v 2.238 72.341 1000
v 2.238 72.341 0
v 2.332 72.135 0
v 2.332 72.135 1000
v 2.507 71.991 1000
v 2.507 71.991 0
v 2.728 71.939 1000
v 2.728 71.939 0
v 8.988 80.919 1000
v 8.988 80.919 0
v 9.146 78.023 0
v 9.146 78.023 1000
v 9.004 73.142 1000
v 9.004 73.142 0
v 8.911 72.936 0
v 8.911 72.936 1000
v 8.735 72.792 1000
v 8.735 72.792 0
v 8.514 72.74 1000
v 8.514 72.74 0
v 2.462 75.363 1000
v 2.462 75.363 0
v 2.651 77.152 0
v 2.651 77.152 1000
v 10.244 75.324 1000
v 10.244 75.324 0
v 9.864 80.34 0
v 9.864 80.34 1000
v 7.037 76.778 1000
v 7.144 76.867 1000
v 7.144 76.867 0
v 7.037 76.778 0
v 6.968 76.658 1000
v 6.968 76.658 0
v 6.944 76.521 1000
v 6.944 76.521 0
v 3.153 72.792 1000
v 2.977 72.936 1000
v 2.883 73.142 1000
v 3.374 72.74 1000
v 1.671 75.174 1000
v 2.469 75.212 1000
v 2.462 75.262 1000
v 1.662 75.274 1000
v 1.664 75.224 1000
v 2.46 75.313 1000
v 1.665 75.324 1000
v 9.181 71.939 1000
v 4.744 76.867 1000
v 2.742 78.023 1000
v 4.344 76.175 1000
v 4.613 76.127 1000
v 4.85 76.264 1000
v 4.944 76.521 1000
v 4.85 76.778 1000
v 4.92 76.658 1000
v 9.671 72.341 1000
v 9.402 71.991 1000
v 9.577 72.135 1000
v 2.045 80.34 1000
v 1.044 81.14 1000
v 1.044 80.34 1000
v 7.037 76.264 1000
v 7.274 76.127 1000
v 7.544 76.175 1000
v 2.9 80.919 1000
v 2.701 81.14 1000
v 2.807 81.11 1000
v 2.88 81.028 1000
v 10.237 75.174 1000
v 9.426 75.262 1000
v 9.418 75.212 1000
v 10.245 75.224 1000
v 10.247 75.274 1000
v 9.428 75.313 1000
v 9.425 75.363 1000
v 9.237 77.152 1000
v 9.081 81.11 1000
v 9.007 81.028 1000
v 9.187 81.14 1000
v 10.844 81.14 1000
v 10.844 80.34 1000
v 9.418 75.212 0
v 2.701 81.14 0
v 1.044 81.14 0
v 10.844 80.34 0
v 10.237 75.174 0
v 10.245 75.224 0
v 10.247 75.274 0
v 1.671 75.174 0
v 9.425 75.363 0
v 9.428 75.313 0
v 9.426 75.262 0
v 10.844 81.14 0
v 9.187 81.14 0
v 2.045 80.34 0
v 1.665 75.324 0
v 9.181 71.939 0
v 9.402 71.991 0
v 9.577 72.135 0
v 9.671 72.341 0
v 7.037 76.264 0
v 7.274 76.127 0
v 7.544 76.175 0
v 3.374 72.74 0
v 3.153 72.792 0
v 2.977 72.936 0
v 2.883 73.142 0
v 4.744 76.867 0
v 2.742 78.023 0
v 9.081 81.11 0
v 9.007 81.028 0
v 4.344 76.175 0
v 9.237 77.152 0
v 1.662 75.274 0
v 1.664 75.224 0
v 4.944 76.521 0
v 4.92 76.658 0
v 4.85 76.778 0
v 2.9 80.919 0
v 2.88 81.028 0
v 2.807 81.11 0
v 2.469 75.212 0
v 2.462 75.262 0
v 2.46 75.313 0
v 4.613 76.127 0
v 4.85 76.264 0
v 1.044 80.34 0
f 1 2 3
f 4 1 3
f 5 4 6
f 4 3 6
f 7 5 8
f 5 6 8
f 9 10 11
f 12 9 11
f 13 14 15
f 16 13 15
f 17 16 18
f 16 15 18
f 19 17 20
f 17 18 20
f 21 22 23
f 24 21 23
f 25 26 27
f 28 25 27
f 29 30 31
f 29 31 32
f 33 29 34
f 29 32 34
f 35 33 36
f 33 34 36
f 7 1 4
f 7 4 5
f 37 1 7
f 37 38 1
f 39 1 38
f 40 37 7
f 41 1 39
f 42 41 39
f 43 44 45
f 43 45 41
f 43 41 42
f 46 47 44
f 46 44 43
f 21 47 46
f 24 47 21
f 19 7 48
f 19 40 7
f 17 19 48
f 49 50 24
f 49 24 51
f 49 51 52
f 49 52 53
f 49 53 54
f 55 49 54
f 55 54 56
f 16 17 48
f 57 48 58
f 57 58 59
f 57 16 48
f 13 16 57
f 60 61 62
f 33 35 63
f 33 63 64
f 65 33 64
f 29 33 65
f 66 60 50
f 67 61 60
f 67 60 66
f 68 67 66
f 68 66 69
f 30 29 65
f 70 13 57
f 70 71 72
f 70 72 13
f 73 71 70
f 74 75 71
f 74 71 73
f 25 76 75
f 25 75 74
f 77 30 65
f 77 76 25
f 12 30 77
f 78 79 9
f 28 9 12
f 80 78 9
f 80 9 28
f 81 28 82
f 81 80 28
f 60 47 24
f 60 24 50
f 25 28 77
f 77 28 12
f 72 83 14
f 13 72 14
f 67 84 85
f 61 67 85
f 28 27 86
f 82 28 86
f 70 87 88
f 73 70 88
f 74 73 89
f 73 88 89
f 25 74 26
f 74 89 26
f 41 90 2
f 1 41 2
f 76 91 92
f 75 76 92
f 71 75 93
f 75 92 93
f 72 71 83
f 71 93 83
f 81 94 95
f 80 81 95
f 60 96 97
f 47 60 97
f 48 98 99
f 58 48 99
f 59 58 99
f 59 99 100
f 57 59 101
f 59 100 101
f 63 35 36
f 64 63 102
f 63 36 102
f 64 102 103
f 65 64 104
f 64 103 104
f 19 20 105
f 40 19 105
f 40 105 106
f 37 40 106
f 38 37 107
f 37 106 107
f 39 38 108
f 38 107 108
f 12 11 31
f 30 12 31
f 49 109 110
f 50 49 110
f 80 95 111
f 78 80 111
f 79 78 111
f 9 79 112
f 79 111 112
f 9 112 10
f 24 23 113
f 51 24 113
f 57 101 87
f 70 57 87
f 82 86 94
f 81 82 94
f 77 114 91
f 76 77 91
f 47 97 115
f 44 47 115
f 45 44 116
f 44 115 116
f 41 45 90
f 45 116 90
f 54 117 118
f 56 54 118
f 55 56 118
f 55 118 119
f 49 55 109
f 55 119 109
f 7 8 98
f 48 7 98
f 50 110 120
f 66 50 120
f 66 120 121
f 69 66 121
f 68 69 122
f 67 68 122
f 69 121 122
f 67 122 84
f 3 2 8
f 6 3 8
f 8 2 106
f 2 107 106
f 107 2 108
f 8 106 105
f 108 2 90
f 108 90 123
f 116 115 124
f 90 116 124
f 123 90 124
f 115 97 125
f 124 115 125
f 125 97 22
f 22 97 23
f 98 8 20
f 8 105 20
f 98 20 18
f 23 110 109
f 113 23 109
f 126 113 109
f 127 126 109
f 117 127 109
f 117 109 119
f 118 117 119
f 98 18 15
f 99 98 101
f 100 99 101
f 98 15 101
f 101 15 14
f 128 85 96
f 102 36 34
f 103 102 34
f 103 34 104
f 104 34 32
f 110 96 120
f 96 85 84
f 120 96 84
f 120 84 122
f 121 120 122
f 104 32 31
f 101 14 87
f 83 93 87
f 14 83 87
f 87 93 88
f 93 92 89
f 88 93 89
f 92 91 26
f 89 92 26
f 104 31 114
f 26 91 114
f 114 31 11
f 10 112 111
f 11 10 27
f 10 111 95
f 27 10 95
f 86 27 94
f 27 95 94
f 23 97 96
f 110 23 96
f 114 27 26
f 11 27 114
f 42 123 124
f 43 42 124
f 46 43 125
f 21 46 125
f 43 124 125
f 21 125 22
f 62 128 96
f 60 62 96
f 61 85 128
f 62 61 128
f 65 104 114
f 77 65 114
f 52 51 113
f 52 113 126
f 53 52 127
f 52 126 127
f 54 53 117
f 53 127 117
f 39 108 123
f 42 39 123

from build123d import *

# Parameters (mm, degrees)
EXTRUDE_1_DEPTH = 1000


with BuildPart() as part:
    # 草图1 → 拉伸1 (new body)
    with BuildSketch(Plane.XY):
        with BuildLine():
            Line((1.043839833, 81.14029792), (1.043839833, 80.34029792))
            Line((1.043839833, 80.34029792), (2.044943692, 80.34029792))
            Line((2.044943692, 80.34029792), (1.664500386, 75.324244599))
            ThreePointArc((1.664500386, 75.324244599), (1.662291386, 75.248793926), (1.671465549, 75.173870508))
            Line((1.671465549, 75.173870508), (2.238017918, 72.341108665))
            ThreePointArc((2.238017918, 72.341108665), (2.411313803, 72.052495662), (2.728308256, 71.939166732))
            Line((2.728308256, 71.939166732), (9.180582792, 71.939166732))
            ThreePointArc((9.180582792, 71.939166732), (9.497577245, 72.052495662), (9.67087313, 72.341108665))
            Line((9.67087313, 72.341108665), (10.237425499, 75.173870508))
            ThreePointArc((10.237425499, 75.173870508), (10.246599662, 75.248793926), (10.244390662, 75.324244599))
            Line((10.244390662, 75.324244599), (9.863947356, 80.34029792))
            Line((9.863947356, 80.34029792), (10.843839833, 80.34029792))
            Line((10.843839833, 80.34029792), (10.843839833, 81.14029792))
            Line((10.843839833, 81.14029792), (9.187027507, 81.14029792))
            ThreePointArc((9.187027507, 81.14029792), (9.038391573, 81.074116301), (8.988125307, 80.919371511))
            Line((8.988125307, 80.919371511), (9.145554921, 78.023027985))
            Line((9.145554921, 78.023027985), (7.143839833, 76.86733724))
            ThreePointArc((7.143839833, 76.86733724), (6.997429672, 76.720927079), (6.943839833, 76.520927079))
            ThreePointArc((6.943839833, 76.520927079), (7.143839833, 76.174516917), (7.543839833, 76.174516917))
            Line((7.543839833, 76.174516917), (9.237177898, 77.152166105))
            Line((9.237177898, 77.152166105), (9.425432977, 75.362831424))
            ThreePointArc((9.425432977, 75.362831424), (9.427641976, 75.287380751), (9.418467813, 75.212457334))
            Line((9.418467813, 75.212457334), (9.004424317, 73.142239853))
            ThreePointArc((9.004424317, 73.142239853), (8.831128432, 72.85362685), (8.514133979, 72.74029792))
            Line((8.514133979, 72.74029792), (3.373545687, 72.74029792))
            ThreePointArc((3.373545687, 72.74029792), (3.056551234, 72.85362685), (2.883255349, 73.142239853))
            Line((2.883255349, 73.142239853), (2.469211853, 75.212457334))
            ThreePointArc((2.469211853, 75.212457334), (2.46003769, 75.287380751), (2.462246689, 75.362831424))
            Line((2.462246689, 75.362831424), (2.650501768, 77.152166105))
            Line((2.650501768, 77.152166105), (4.343839833, 76.174516917))
            ThreePointArc((4.343839833, 76.174516917), (4.743839833, 76.174516917), (4.943839833, 76.520927079))
            ThreePointArc((4.943839833, 76.520927079), (4.890249995, 76.720927079), (4.743839833, 76.86733724))
            Line((4.743839833, 76.86733724), (2.742124745, 78.023027985))
            Line((2.742124745, 78.023027985), (2.899554359, 80.919371511))
            ThreePointArc((2.899554359, 80.919371511), (2.849288093, 81.074116301), (2.700652159, 81.14029792))
            Line((2.700652159, 81.14029792), (1.043839833, 81.14029792))
        make_face()
    extrude(amount=EXTRUDE_1_DEPTH)


solid = part.part
